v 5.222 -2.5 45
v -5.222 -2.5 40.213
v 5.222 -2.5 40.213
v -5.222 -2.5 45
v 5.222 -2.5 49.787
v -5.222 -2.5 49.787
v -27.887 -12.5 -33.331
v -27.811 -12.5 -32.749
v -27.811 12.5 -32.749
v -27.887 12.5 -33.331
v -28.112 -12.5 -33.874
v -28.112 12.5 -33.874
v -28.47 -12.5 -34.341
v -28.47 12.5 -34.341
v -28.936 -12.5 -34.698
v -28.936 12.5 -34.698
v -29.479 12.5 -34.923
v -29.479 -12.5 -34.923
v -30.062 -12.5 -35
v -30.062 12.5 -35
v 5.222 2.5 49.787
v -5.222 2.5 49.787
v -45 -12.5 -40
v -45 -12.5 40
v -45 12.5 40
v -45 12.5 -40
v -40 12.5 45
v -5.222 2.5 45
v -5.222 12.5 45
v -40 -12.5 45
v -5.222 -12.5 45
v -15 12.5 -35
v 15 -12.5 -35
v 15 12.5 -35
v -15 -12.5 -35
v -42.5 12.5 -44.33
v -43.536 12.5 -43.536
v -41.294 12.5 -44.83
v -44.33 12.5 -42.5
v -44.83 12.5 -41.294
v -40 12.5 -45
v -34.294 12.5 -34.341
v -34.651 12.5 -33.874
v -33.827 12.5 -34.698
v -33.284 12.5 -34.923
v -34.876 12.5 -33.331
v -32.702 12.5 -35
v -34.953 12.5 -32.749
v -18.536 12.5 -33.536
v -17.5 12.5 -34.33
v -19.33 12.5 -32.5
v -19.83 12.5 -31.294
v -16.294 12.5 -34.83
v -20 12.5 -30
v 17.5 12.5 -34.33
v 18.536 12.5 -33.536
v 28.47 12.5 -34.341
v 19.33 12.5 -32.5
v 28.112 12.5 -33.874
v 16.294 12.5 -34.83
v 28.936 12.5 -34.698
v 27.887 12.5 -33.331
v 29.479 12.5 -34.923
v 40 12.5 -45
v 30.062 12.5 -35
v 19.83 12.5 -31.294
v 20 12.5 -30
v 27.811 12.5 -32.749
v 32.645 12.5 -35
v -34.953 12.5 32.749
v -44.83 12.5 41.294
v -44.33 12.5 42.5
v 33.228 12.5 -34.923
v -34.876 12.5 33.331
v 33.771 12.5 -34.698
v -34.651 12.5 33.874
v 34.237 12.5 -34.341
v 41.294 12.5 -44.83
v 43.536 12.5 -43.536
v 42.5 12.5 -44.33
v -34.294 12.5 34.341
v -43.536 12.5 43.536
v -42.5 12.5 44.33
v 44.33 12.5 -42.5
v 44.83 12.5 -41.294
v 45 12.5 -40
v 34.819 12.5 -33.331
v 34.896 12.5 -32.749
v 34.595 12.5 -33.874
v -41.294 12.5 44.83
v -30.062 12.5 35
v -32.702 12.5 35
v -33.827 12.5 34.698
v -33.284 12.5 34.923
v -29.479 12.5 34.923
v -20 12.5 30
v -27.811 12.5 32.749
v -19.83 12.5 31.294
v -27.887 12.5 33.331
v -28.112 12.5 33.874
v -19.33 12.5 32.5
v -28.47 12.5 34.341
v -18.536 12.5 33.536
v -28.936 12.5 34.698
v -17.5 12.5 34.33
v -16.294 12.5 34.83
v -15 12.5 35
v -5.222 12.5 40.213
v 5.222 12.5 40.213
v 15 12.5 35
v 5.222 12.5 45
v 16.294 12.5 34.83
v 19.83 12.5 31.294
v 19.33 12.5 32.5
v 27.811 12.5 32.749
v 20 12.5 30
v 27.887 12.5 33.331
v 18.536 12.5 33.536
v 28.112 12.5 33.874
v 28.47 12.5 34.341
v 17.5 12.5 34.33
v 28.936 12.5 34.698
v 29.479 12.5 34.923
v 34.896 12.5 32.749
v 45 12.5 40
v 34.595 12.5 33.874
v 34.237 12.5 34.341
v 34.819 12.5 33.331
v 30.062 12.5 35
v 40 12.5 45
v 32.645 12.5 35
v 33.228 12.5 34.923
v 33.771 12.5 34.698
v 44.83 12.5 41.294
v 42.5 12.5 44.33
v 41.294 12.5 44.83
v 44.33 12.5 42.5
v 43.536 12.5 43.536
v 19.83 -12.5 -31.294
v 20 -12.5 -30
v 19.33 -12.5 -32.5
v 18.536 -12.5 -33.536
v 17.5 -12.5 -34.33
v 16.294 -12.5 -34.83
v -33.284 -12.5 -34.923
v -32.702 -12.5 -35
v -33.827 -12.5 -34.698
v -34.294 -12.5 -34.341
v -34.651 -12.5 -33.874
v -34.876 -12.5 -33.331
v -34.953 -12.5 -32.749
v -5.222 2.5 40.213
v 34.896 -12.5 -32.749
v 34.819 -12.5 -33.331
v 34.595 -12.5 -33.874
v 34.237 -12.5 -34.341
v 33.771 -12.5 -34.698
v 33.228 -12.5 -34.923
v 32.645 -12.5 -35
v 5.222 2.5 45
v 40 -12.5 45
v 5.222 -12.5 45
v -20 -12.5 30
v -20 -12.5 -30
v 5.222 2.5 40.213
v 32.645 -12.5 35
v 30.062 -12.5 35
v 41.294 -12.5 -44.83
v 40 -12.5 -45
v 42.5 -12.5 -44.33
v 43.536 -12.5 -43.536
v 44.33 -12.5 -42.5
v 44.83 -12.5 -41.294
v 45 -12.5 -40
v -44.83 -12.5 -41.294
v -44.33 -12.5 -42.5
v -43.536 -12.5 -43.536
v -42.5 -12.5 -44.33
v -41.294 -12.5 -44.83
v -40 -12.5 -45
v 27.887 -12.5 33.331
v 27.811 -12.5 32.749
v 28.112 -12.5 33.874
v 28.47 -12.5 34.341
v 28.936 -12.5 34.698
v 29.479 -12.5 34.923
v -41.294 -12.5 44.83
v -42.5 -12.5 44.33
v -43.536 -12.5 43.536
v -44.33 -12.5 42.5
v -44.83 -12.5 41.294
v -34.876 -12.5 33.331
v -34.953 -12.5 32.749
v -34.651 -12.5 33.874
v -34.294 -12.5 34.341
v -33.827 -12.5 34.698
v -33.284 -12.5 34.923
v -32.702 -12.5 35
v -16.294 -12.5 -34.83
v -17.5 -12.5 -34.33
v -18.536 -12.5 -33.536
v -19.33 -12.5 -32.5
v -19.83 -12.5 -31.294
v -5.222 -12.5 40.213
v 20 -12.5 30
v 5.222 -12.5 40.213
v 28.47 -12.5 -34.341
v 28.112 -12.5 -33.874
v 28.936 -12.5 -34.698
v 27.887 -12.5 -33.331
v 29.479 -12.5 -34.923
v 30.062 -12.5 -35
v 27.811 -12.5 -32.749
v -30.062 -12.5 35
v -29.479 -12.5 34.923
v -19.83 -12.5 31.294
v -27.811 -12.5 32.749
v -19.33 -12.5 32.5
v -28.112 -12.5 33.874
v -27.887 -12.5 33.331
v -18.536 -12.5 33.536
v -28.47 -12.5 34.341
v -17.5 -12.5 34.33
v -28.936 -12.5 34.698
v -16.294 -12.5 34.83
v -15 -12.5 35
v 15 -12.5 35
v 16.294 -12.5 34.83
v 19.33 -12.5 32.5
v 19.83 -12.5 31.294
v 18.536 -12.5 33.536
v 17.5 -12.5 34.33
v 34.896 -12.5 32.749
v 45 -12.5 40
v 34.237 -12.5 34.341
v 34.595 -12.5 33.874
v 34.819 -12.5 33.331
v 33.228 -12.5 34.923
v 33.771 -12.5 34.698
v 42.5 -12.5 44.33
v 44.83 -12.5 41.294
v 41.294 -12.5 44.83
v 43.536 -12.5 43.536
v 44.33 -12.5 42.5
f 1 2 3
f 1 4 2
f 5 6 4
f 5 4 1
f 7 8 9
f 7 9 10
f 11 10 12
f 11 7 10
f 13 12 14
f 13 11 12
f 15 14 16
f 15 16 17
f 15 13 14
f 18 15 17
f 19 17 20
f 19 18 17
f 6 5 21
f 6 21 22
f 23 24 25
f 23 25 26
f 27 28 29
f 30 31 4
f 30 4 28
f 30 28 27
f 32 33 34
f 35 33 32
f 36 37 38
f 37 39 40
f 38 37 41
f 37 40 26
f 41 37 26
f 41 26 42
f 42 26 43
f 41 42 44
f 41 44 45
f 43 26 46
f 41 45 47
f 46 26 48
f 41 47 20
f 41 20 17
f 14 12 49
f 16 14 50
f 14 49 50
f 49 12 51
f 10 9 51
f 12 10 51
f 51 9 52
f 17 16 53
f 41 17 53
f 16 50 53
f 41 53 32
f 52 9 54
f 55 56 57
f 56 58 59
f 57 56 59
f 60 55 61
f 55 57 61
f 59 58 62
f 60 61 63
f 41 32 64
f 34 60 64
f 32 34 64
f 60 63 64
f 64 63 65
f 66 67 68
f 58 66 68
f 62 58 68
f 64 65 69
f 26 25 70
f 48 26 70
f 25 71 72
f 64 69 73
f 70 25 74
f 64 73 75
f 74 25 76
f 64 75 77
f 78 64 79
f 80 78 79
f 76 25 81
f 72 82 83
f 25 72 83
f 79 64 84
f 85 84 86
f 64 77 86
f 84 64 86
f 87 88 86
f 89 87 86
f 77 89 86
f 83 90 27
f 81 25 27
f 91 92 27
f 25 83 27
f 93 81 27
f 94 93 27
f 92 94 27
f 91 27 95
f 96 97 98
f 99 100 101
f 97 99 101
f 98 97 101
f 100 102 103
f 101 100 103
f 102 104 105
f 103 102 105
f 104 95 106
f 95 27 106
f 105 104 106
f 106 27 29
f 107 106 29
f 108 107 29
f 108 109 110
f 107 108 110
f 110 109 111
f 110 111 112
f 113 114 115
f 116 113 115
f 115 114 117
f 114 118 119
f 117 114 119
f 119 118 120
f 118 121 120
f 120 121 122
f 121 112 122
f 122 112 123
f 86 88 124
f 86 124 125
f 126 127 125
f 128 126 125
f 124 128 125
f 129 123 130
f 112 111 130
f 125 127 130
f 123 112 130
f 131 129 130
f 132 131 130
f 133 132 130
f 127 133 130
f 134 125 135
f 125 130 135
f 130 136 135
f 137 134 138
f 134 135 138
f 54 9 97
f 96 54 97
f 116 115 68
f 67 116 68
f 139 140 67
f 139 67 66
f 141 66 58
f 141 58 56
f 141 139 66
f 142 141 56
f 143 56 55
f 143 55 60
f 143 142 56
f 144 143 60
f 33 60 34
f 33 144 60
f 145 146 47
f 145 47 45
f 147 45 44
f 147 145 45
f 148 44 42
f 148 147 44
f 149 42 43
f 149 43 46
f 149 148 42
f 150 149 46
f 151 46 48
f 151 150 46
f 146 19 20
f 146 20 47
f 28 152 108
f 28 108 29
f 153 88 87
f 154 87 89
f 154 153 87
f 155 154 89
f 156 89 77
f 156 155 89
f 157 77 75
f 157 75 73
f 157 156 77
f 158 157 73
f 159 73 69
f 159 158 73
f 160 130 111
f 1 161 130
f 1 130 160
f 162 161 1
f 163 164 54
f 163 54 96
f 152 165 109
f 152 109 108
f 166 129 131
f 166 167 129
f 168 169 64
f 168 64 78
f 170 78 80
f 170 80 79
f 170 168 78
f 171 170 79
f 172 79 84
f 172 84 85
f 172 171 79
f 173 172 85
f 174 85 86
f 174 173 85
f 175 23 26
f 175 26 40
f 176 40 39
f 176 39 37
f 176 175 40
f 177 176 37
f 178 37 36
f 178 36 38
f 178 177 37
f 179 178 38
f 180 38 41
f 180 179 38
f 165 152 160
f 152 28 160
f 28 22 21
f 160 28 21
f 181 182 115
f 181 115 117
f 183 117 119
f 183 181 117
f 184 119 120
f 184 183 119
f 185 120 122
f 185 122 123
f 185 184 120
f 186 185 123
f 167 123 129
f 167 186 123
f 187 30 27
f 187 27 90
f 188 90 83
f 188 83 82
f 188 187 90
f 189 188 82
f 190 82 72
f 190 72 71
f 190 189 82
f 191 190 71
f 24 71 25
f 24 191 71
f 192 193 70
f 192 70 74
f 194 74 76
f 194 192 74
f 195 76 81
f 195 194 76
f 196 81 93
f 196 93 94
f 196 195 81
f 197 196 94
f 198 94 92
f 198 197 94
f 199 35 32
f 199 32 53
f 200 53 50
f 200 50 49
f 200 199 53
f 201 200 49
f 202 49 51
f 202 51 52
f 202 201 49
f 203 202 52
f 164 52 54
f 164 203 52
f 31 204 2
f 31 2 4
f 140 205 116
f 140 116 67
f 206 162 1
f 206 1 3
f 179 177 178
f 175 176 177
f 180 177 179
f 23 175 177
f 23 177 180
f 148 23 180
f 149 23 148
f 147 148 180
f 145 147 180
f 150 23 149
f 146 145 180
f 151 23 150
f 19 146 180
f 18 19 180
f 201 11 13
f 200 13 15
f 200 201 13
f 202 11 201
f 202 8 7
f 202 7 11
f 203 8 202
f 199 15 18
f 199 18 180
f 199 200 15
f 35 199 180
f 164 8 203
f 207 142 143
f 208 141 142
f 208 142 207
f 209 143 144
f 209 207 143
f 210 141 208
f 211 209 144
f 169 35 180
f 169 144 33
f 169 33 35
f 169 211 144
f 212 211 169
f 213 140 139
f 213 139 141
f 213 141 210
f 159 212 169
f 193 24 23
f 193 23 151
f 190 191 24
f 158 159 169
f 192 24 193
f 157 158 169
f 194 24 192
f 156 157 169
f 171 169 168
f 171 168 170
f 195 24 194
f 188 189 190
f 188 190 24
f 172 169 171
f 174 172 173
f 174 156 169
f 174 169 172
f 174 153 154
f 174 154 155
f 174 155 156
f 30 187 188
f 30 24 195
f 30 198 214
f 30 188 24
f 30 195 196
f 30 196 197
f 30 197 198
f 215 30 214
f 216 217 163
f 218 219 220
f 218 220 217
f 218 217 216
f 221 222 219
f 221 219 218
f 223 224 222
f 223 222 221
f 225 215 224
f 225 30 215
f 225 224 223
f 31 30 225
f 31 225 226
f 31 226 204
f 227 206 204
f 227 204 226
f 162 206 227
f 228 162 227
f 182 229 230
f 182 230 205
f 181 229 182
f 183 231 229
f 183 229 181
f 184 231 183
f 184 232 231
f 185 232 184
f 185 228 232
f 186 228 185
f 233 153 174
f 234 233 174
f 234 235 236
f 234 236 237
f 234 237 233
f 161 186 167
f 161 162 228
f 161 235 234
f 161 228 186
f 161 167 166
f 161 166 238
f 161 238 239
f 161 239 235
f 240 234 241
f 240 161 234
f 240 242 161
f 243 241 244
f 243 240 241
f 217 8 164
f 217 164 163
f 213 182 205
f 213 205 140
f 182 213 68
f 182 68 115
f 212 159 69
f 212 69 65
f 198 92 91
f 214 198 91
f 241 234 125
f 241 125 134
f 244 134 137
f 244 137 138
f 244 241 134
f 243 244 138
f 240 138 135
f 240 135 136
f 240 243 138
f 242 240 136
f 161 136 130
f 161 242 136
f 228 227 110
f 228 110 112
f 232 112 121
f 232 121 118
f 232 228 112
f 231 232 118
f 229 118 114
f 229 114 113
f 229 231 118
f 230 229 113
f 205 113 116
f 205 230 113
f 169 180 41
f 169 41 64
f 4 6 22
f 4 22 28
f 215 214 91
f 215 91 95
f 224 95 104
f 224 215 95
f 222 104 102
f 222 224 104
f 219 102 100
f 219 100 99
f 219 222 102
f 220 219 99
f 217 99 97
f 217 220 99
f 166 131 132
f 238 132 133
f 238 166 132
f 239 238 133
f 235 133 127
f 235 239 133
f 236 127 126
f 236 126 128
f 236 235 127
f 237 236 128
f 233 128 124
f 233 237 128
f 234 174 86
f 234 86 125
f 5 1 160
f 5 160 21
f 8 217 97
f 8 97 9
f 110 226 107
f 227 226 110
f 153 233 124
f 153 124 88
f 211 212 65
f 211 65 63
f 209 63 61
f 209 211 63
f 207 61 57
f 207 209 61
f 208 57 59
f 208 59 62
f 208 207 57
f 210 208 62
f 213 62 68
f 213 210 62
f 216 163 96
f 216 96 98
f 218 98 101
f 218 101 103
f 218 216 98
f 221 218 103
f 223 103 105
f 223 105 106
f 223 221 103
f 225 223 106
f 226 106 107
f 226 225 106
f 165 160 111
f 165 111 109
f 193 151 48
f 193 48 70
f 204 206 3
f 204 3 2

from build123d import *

# Parameters (mm, degrees)
F0_W     = 5.222296
F0_H     = 4.786847
F1_DEPTH = 2.5
F2_DEPTH = 12.5


with BuildPart() as f1:
    # F0 (on Front) → F1 (new body, symmetric)
    with BuildSketch(Plane.XZ):
        with Locations((2.611148, 47.393423)):
            Rectangle(F0_W, F0_H)
        with Locations((-2.611148, 47.393423)):
            Rectangle(F0_W, F0_H)
        Polygon((0, 45), (-5.222296, 45), (-5.222296, 40.213153), (5.222296, 40.213153), (5.222296, 45), align=None)
    extrude(amount=F1_DEPTH, both=True)

    # F0 (on Front) → F2 (join, symmetric)
    with BuildSketch(Plane.XZ):
        with BuildLine():
            Line((-5.222296, 45), (-40, 45))
            ThreePointArc((-40, 45), (-43.535534, 43.535534), (-45, 40))
            Line((-45, 40), (-45, -40))
            ThreePointArc((-45, -40), (-43.535534, -43.535534), (-40, -45))
            Line((-40, -45), (40, -45))
            ThreePointArc((40, -45), (43.535534, -43.535534), (45, -40))
            Line((45, -40), (45, 40))
            ThreePointArc((45, 40), (43.535534, 43.535534), (40, 45))
            Line((40, 45), (5.222296, 45))
            Line((5.222296, 45), (5.222296, 40.213153))
            Line((5.222296, 40.213153), (-5.222296, 40.213153))
            Line((-5.222296, 40.213153), (-5.222296, 45))
        make_face()
        with BuildLine():
            Line((3.352741, 35), (8.352741, 35))
            Line((8.352741, 35), (15, 35))
            Line((15, 35), (27.810507, 35))
            Line((27.810507, 35), (30.06182, 35))
            Line((30.06182, 35), (32.644888, 35))
            ThreePointArc((32.644888, 35), (34.236806, 34.340606), (34.8962, 32.748687))
            Line((34.8962, 32.748687), (34.8962, -32.748687))
            ThreePointArc((34.8962, -32.748687), (34.236806, -34.340606), (32.644888, -35))
            Line((32.644888, -35), (30.06182, -35))
            Line((30.06182, -35), (27.810507, -35))
            Line((27.810507, -35), (15, -35))
            Line((15, -35), (8.352741, -35))
            Line((8.352741, -35), (3.352741, -35))
            Line((3.352741, -35), (0, -35))
            Line((0, -35), (-3.352741, -35))
            Line((-3.352741, -35), (-8.352741, -35))
            Line((-8.352741, -35), (-15, -35))
            Line((-15, -35), (-27.810507, -35))
            Line((-27.810507, -35), (-30.06182, -35))
            Line((-30.06182, -35), (-32.701636, -35))
            ThreePointArc((-32.701636, -35), (-34.293555, -34.340606), (-34.952949, -32.748687))
            Line((-34.952949, -32.748687), (-34.952949, 32.748687))
            ThreePointArc((-34.952949, 32.748687), (-34.293555, 34.340606), (-32.701636, 35))
            Line((-32.701636, 35), (-30.06182, 35))
            Line((-30.06182, 35), (-27.810507, 35))
            Line((-27.810507, 35), (-15, 35))
            Line((-15, 35), (-8.352741, 35))
            Line((-8.352741, 35), (-3.352741, 35))
            Line((-3.352741, 35), (0, 35))
            Line((0, 35), (3.352741, 35))
        make_face(mode=Mode.SUBTRACT)
        with BuildLine():
            ThreePointArc((-20, 30), (-18.535534, 33.535534), (-15, 35))
            Line((-15, 35), (-27.810507, 35))
            Line((-27.810507, 35), (-30.06182, 35))
            ThreePointArc((-30.06182, 35), (-28.469901, 34.340606), (-27.810507, 32.748687))
            Line((-27.810507, 32.748687), (-27.810507, -32.748687))
            ThreePointArc((-27.810507, -32.748687), (-28.469901, -34.340606), (-30.06182, -35))
            Line((-30.06182, -35), (-27.810507, -35))
            Line((-27.810507, -35), (-15, -35))
            ThreePointArc((-15, -35), (-18.535534, -33.535534), (-20, -30))
            Line((-20, -30), (-20, 30))
        make_face()
        with BuildLine():
            Line((27.810507, 35), (15, 35))
            ThreePointArc((15, 35), (18.535534, 33.535534), (20, 30))
            Line((20, 30), (20, -30))
            ThreePointArc((20, -30), (18.535534, -33.535534), (15, -35))
            Line((15, -35), (27.810507, -35))
            Line((27.810507, -35), (30.06182, -35))
            ThreePointArc((30.06182, -35), (28.469901, -34.340606), (27.810507, -32.748687))
            Line((27.810507, -32.748687), (27.810507, 32.748687))
            ThreePointArc((27.810507, 32.748687), (28.469901, 34.340606), (30.06182, 35))
            Line((30.06182, 35), (27.810507, 35))
        make_face()
    extrude(amount=F2_DEPTH, both=True)


solid = f1.part
